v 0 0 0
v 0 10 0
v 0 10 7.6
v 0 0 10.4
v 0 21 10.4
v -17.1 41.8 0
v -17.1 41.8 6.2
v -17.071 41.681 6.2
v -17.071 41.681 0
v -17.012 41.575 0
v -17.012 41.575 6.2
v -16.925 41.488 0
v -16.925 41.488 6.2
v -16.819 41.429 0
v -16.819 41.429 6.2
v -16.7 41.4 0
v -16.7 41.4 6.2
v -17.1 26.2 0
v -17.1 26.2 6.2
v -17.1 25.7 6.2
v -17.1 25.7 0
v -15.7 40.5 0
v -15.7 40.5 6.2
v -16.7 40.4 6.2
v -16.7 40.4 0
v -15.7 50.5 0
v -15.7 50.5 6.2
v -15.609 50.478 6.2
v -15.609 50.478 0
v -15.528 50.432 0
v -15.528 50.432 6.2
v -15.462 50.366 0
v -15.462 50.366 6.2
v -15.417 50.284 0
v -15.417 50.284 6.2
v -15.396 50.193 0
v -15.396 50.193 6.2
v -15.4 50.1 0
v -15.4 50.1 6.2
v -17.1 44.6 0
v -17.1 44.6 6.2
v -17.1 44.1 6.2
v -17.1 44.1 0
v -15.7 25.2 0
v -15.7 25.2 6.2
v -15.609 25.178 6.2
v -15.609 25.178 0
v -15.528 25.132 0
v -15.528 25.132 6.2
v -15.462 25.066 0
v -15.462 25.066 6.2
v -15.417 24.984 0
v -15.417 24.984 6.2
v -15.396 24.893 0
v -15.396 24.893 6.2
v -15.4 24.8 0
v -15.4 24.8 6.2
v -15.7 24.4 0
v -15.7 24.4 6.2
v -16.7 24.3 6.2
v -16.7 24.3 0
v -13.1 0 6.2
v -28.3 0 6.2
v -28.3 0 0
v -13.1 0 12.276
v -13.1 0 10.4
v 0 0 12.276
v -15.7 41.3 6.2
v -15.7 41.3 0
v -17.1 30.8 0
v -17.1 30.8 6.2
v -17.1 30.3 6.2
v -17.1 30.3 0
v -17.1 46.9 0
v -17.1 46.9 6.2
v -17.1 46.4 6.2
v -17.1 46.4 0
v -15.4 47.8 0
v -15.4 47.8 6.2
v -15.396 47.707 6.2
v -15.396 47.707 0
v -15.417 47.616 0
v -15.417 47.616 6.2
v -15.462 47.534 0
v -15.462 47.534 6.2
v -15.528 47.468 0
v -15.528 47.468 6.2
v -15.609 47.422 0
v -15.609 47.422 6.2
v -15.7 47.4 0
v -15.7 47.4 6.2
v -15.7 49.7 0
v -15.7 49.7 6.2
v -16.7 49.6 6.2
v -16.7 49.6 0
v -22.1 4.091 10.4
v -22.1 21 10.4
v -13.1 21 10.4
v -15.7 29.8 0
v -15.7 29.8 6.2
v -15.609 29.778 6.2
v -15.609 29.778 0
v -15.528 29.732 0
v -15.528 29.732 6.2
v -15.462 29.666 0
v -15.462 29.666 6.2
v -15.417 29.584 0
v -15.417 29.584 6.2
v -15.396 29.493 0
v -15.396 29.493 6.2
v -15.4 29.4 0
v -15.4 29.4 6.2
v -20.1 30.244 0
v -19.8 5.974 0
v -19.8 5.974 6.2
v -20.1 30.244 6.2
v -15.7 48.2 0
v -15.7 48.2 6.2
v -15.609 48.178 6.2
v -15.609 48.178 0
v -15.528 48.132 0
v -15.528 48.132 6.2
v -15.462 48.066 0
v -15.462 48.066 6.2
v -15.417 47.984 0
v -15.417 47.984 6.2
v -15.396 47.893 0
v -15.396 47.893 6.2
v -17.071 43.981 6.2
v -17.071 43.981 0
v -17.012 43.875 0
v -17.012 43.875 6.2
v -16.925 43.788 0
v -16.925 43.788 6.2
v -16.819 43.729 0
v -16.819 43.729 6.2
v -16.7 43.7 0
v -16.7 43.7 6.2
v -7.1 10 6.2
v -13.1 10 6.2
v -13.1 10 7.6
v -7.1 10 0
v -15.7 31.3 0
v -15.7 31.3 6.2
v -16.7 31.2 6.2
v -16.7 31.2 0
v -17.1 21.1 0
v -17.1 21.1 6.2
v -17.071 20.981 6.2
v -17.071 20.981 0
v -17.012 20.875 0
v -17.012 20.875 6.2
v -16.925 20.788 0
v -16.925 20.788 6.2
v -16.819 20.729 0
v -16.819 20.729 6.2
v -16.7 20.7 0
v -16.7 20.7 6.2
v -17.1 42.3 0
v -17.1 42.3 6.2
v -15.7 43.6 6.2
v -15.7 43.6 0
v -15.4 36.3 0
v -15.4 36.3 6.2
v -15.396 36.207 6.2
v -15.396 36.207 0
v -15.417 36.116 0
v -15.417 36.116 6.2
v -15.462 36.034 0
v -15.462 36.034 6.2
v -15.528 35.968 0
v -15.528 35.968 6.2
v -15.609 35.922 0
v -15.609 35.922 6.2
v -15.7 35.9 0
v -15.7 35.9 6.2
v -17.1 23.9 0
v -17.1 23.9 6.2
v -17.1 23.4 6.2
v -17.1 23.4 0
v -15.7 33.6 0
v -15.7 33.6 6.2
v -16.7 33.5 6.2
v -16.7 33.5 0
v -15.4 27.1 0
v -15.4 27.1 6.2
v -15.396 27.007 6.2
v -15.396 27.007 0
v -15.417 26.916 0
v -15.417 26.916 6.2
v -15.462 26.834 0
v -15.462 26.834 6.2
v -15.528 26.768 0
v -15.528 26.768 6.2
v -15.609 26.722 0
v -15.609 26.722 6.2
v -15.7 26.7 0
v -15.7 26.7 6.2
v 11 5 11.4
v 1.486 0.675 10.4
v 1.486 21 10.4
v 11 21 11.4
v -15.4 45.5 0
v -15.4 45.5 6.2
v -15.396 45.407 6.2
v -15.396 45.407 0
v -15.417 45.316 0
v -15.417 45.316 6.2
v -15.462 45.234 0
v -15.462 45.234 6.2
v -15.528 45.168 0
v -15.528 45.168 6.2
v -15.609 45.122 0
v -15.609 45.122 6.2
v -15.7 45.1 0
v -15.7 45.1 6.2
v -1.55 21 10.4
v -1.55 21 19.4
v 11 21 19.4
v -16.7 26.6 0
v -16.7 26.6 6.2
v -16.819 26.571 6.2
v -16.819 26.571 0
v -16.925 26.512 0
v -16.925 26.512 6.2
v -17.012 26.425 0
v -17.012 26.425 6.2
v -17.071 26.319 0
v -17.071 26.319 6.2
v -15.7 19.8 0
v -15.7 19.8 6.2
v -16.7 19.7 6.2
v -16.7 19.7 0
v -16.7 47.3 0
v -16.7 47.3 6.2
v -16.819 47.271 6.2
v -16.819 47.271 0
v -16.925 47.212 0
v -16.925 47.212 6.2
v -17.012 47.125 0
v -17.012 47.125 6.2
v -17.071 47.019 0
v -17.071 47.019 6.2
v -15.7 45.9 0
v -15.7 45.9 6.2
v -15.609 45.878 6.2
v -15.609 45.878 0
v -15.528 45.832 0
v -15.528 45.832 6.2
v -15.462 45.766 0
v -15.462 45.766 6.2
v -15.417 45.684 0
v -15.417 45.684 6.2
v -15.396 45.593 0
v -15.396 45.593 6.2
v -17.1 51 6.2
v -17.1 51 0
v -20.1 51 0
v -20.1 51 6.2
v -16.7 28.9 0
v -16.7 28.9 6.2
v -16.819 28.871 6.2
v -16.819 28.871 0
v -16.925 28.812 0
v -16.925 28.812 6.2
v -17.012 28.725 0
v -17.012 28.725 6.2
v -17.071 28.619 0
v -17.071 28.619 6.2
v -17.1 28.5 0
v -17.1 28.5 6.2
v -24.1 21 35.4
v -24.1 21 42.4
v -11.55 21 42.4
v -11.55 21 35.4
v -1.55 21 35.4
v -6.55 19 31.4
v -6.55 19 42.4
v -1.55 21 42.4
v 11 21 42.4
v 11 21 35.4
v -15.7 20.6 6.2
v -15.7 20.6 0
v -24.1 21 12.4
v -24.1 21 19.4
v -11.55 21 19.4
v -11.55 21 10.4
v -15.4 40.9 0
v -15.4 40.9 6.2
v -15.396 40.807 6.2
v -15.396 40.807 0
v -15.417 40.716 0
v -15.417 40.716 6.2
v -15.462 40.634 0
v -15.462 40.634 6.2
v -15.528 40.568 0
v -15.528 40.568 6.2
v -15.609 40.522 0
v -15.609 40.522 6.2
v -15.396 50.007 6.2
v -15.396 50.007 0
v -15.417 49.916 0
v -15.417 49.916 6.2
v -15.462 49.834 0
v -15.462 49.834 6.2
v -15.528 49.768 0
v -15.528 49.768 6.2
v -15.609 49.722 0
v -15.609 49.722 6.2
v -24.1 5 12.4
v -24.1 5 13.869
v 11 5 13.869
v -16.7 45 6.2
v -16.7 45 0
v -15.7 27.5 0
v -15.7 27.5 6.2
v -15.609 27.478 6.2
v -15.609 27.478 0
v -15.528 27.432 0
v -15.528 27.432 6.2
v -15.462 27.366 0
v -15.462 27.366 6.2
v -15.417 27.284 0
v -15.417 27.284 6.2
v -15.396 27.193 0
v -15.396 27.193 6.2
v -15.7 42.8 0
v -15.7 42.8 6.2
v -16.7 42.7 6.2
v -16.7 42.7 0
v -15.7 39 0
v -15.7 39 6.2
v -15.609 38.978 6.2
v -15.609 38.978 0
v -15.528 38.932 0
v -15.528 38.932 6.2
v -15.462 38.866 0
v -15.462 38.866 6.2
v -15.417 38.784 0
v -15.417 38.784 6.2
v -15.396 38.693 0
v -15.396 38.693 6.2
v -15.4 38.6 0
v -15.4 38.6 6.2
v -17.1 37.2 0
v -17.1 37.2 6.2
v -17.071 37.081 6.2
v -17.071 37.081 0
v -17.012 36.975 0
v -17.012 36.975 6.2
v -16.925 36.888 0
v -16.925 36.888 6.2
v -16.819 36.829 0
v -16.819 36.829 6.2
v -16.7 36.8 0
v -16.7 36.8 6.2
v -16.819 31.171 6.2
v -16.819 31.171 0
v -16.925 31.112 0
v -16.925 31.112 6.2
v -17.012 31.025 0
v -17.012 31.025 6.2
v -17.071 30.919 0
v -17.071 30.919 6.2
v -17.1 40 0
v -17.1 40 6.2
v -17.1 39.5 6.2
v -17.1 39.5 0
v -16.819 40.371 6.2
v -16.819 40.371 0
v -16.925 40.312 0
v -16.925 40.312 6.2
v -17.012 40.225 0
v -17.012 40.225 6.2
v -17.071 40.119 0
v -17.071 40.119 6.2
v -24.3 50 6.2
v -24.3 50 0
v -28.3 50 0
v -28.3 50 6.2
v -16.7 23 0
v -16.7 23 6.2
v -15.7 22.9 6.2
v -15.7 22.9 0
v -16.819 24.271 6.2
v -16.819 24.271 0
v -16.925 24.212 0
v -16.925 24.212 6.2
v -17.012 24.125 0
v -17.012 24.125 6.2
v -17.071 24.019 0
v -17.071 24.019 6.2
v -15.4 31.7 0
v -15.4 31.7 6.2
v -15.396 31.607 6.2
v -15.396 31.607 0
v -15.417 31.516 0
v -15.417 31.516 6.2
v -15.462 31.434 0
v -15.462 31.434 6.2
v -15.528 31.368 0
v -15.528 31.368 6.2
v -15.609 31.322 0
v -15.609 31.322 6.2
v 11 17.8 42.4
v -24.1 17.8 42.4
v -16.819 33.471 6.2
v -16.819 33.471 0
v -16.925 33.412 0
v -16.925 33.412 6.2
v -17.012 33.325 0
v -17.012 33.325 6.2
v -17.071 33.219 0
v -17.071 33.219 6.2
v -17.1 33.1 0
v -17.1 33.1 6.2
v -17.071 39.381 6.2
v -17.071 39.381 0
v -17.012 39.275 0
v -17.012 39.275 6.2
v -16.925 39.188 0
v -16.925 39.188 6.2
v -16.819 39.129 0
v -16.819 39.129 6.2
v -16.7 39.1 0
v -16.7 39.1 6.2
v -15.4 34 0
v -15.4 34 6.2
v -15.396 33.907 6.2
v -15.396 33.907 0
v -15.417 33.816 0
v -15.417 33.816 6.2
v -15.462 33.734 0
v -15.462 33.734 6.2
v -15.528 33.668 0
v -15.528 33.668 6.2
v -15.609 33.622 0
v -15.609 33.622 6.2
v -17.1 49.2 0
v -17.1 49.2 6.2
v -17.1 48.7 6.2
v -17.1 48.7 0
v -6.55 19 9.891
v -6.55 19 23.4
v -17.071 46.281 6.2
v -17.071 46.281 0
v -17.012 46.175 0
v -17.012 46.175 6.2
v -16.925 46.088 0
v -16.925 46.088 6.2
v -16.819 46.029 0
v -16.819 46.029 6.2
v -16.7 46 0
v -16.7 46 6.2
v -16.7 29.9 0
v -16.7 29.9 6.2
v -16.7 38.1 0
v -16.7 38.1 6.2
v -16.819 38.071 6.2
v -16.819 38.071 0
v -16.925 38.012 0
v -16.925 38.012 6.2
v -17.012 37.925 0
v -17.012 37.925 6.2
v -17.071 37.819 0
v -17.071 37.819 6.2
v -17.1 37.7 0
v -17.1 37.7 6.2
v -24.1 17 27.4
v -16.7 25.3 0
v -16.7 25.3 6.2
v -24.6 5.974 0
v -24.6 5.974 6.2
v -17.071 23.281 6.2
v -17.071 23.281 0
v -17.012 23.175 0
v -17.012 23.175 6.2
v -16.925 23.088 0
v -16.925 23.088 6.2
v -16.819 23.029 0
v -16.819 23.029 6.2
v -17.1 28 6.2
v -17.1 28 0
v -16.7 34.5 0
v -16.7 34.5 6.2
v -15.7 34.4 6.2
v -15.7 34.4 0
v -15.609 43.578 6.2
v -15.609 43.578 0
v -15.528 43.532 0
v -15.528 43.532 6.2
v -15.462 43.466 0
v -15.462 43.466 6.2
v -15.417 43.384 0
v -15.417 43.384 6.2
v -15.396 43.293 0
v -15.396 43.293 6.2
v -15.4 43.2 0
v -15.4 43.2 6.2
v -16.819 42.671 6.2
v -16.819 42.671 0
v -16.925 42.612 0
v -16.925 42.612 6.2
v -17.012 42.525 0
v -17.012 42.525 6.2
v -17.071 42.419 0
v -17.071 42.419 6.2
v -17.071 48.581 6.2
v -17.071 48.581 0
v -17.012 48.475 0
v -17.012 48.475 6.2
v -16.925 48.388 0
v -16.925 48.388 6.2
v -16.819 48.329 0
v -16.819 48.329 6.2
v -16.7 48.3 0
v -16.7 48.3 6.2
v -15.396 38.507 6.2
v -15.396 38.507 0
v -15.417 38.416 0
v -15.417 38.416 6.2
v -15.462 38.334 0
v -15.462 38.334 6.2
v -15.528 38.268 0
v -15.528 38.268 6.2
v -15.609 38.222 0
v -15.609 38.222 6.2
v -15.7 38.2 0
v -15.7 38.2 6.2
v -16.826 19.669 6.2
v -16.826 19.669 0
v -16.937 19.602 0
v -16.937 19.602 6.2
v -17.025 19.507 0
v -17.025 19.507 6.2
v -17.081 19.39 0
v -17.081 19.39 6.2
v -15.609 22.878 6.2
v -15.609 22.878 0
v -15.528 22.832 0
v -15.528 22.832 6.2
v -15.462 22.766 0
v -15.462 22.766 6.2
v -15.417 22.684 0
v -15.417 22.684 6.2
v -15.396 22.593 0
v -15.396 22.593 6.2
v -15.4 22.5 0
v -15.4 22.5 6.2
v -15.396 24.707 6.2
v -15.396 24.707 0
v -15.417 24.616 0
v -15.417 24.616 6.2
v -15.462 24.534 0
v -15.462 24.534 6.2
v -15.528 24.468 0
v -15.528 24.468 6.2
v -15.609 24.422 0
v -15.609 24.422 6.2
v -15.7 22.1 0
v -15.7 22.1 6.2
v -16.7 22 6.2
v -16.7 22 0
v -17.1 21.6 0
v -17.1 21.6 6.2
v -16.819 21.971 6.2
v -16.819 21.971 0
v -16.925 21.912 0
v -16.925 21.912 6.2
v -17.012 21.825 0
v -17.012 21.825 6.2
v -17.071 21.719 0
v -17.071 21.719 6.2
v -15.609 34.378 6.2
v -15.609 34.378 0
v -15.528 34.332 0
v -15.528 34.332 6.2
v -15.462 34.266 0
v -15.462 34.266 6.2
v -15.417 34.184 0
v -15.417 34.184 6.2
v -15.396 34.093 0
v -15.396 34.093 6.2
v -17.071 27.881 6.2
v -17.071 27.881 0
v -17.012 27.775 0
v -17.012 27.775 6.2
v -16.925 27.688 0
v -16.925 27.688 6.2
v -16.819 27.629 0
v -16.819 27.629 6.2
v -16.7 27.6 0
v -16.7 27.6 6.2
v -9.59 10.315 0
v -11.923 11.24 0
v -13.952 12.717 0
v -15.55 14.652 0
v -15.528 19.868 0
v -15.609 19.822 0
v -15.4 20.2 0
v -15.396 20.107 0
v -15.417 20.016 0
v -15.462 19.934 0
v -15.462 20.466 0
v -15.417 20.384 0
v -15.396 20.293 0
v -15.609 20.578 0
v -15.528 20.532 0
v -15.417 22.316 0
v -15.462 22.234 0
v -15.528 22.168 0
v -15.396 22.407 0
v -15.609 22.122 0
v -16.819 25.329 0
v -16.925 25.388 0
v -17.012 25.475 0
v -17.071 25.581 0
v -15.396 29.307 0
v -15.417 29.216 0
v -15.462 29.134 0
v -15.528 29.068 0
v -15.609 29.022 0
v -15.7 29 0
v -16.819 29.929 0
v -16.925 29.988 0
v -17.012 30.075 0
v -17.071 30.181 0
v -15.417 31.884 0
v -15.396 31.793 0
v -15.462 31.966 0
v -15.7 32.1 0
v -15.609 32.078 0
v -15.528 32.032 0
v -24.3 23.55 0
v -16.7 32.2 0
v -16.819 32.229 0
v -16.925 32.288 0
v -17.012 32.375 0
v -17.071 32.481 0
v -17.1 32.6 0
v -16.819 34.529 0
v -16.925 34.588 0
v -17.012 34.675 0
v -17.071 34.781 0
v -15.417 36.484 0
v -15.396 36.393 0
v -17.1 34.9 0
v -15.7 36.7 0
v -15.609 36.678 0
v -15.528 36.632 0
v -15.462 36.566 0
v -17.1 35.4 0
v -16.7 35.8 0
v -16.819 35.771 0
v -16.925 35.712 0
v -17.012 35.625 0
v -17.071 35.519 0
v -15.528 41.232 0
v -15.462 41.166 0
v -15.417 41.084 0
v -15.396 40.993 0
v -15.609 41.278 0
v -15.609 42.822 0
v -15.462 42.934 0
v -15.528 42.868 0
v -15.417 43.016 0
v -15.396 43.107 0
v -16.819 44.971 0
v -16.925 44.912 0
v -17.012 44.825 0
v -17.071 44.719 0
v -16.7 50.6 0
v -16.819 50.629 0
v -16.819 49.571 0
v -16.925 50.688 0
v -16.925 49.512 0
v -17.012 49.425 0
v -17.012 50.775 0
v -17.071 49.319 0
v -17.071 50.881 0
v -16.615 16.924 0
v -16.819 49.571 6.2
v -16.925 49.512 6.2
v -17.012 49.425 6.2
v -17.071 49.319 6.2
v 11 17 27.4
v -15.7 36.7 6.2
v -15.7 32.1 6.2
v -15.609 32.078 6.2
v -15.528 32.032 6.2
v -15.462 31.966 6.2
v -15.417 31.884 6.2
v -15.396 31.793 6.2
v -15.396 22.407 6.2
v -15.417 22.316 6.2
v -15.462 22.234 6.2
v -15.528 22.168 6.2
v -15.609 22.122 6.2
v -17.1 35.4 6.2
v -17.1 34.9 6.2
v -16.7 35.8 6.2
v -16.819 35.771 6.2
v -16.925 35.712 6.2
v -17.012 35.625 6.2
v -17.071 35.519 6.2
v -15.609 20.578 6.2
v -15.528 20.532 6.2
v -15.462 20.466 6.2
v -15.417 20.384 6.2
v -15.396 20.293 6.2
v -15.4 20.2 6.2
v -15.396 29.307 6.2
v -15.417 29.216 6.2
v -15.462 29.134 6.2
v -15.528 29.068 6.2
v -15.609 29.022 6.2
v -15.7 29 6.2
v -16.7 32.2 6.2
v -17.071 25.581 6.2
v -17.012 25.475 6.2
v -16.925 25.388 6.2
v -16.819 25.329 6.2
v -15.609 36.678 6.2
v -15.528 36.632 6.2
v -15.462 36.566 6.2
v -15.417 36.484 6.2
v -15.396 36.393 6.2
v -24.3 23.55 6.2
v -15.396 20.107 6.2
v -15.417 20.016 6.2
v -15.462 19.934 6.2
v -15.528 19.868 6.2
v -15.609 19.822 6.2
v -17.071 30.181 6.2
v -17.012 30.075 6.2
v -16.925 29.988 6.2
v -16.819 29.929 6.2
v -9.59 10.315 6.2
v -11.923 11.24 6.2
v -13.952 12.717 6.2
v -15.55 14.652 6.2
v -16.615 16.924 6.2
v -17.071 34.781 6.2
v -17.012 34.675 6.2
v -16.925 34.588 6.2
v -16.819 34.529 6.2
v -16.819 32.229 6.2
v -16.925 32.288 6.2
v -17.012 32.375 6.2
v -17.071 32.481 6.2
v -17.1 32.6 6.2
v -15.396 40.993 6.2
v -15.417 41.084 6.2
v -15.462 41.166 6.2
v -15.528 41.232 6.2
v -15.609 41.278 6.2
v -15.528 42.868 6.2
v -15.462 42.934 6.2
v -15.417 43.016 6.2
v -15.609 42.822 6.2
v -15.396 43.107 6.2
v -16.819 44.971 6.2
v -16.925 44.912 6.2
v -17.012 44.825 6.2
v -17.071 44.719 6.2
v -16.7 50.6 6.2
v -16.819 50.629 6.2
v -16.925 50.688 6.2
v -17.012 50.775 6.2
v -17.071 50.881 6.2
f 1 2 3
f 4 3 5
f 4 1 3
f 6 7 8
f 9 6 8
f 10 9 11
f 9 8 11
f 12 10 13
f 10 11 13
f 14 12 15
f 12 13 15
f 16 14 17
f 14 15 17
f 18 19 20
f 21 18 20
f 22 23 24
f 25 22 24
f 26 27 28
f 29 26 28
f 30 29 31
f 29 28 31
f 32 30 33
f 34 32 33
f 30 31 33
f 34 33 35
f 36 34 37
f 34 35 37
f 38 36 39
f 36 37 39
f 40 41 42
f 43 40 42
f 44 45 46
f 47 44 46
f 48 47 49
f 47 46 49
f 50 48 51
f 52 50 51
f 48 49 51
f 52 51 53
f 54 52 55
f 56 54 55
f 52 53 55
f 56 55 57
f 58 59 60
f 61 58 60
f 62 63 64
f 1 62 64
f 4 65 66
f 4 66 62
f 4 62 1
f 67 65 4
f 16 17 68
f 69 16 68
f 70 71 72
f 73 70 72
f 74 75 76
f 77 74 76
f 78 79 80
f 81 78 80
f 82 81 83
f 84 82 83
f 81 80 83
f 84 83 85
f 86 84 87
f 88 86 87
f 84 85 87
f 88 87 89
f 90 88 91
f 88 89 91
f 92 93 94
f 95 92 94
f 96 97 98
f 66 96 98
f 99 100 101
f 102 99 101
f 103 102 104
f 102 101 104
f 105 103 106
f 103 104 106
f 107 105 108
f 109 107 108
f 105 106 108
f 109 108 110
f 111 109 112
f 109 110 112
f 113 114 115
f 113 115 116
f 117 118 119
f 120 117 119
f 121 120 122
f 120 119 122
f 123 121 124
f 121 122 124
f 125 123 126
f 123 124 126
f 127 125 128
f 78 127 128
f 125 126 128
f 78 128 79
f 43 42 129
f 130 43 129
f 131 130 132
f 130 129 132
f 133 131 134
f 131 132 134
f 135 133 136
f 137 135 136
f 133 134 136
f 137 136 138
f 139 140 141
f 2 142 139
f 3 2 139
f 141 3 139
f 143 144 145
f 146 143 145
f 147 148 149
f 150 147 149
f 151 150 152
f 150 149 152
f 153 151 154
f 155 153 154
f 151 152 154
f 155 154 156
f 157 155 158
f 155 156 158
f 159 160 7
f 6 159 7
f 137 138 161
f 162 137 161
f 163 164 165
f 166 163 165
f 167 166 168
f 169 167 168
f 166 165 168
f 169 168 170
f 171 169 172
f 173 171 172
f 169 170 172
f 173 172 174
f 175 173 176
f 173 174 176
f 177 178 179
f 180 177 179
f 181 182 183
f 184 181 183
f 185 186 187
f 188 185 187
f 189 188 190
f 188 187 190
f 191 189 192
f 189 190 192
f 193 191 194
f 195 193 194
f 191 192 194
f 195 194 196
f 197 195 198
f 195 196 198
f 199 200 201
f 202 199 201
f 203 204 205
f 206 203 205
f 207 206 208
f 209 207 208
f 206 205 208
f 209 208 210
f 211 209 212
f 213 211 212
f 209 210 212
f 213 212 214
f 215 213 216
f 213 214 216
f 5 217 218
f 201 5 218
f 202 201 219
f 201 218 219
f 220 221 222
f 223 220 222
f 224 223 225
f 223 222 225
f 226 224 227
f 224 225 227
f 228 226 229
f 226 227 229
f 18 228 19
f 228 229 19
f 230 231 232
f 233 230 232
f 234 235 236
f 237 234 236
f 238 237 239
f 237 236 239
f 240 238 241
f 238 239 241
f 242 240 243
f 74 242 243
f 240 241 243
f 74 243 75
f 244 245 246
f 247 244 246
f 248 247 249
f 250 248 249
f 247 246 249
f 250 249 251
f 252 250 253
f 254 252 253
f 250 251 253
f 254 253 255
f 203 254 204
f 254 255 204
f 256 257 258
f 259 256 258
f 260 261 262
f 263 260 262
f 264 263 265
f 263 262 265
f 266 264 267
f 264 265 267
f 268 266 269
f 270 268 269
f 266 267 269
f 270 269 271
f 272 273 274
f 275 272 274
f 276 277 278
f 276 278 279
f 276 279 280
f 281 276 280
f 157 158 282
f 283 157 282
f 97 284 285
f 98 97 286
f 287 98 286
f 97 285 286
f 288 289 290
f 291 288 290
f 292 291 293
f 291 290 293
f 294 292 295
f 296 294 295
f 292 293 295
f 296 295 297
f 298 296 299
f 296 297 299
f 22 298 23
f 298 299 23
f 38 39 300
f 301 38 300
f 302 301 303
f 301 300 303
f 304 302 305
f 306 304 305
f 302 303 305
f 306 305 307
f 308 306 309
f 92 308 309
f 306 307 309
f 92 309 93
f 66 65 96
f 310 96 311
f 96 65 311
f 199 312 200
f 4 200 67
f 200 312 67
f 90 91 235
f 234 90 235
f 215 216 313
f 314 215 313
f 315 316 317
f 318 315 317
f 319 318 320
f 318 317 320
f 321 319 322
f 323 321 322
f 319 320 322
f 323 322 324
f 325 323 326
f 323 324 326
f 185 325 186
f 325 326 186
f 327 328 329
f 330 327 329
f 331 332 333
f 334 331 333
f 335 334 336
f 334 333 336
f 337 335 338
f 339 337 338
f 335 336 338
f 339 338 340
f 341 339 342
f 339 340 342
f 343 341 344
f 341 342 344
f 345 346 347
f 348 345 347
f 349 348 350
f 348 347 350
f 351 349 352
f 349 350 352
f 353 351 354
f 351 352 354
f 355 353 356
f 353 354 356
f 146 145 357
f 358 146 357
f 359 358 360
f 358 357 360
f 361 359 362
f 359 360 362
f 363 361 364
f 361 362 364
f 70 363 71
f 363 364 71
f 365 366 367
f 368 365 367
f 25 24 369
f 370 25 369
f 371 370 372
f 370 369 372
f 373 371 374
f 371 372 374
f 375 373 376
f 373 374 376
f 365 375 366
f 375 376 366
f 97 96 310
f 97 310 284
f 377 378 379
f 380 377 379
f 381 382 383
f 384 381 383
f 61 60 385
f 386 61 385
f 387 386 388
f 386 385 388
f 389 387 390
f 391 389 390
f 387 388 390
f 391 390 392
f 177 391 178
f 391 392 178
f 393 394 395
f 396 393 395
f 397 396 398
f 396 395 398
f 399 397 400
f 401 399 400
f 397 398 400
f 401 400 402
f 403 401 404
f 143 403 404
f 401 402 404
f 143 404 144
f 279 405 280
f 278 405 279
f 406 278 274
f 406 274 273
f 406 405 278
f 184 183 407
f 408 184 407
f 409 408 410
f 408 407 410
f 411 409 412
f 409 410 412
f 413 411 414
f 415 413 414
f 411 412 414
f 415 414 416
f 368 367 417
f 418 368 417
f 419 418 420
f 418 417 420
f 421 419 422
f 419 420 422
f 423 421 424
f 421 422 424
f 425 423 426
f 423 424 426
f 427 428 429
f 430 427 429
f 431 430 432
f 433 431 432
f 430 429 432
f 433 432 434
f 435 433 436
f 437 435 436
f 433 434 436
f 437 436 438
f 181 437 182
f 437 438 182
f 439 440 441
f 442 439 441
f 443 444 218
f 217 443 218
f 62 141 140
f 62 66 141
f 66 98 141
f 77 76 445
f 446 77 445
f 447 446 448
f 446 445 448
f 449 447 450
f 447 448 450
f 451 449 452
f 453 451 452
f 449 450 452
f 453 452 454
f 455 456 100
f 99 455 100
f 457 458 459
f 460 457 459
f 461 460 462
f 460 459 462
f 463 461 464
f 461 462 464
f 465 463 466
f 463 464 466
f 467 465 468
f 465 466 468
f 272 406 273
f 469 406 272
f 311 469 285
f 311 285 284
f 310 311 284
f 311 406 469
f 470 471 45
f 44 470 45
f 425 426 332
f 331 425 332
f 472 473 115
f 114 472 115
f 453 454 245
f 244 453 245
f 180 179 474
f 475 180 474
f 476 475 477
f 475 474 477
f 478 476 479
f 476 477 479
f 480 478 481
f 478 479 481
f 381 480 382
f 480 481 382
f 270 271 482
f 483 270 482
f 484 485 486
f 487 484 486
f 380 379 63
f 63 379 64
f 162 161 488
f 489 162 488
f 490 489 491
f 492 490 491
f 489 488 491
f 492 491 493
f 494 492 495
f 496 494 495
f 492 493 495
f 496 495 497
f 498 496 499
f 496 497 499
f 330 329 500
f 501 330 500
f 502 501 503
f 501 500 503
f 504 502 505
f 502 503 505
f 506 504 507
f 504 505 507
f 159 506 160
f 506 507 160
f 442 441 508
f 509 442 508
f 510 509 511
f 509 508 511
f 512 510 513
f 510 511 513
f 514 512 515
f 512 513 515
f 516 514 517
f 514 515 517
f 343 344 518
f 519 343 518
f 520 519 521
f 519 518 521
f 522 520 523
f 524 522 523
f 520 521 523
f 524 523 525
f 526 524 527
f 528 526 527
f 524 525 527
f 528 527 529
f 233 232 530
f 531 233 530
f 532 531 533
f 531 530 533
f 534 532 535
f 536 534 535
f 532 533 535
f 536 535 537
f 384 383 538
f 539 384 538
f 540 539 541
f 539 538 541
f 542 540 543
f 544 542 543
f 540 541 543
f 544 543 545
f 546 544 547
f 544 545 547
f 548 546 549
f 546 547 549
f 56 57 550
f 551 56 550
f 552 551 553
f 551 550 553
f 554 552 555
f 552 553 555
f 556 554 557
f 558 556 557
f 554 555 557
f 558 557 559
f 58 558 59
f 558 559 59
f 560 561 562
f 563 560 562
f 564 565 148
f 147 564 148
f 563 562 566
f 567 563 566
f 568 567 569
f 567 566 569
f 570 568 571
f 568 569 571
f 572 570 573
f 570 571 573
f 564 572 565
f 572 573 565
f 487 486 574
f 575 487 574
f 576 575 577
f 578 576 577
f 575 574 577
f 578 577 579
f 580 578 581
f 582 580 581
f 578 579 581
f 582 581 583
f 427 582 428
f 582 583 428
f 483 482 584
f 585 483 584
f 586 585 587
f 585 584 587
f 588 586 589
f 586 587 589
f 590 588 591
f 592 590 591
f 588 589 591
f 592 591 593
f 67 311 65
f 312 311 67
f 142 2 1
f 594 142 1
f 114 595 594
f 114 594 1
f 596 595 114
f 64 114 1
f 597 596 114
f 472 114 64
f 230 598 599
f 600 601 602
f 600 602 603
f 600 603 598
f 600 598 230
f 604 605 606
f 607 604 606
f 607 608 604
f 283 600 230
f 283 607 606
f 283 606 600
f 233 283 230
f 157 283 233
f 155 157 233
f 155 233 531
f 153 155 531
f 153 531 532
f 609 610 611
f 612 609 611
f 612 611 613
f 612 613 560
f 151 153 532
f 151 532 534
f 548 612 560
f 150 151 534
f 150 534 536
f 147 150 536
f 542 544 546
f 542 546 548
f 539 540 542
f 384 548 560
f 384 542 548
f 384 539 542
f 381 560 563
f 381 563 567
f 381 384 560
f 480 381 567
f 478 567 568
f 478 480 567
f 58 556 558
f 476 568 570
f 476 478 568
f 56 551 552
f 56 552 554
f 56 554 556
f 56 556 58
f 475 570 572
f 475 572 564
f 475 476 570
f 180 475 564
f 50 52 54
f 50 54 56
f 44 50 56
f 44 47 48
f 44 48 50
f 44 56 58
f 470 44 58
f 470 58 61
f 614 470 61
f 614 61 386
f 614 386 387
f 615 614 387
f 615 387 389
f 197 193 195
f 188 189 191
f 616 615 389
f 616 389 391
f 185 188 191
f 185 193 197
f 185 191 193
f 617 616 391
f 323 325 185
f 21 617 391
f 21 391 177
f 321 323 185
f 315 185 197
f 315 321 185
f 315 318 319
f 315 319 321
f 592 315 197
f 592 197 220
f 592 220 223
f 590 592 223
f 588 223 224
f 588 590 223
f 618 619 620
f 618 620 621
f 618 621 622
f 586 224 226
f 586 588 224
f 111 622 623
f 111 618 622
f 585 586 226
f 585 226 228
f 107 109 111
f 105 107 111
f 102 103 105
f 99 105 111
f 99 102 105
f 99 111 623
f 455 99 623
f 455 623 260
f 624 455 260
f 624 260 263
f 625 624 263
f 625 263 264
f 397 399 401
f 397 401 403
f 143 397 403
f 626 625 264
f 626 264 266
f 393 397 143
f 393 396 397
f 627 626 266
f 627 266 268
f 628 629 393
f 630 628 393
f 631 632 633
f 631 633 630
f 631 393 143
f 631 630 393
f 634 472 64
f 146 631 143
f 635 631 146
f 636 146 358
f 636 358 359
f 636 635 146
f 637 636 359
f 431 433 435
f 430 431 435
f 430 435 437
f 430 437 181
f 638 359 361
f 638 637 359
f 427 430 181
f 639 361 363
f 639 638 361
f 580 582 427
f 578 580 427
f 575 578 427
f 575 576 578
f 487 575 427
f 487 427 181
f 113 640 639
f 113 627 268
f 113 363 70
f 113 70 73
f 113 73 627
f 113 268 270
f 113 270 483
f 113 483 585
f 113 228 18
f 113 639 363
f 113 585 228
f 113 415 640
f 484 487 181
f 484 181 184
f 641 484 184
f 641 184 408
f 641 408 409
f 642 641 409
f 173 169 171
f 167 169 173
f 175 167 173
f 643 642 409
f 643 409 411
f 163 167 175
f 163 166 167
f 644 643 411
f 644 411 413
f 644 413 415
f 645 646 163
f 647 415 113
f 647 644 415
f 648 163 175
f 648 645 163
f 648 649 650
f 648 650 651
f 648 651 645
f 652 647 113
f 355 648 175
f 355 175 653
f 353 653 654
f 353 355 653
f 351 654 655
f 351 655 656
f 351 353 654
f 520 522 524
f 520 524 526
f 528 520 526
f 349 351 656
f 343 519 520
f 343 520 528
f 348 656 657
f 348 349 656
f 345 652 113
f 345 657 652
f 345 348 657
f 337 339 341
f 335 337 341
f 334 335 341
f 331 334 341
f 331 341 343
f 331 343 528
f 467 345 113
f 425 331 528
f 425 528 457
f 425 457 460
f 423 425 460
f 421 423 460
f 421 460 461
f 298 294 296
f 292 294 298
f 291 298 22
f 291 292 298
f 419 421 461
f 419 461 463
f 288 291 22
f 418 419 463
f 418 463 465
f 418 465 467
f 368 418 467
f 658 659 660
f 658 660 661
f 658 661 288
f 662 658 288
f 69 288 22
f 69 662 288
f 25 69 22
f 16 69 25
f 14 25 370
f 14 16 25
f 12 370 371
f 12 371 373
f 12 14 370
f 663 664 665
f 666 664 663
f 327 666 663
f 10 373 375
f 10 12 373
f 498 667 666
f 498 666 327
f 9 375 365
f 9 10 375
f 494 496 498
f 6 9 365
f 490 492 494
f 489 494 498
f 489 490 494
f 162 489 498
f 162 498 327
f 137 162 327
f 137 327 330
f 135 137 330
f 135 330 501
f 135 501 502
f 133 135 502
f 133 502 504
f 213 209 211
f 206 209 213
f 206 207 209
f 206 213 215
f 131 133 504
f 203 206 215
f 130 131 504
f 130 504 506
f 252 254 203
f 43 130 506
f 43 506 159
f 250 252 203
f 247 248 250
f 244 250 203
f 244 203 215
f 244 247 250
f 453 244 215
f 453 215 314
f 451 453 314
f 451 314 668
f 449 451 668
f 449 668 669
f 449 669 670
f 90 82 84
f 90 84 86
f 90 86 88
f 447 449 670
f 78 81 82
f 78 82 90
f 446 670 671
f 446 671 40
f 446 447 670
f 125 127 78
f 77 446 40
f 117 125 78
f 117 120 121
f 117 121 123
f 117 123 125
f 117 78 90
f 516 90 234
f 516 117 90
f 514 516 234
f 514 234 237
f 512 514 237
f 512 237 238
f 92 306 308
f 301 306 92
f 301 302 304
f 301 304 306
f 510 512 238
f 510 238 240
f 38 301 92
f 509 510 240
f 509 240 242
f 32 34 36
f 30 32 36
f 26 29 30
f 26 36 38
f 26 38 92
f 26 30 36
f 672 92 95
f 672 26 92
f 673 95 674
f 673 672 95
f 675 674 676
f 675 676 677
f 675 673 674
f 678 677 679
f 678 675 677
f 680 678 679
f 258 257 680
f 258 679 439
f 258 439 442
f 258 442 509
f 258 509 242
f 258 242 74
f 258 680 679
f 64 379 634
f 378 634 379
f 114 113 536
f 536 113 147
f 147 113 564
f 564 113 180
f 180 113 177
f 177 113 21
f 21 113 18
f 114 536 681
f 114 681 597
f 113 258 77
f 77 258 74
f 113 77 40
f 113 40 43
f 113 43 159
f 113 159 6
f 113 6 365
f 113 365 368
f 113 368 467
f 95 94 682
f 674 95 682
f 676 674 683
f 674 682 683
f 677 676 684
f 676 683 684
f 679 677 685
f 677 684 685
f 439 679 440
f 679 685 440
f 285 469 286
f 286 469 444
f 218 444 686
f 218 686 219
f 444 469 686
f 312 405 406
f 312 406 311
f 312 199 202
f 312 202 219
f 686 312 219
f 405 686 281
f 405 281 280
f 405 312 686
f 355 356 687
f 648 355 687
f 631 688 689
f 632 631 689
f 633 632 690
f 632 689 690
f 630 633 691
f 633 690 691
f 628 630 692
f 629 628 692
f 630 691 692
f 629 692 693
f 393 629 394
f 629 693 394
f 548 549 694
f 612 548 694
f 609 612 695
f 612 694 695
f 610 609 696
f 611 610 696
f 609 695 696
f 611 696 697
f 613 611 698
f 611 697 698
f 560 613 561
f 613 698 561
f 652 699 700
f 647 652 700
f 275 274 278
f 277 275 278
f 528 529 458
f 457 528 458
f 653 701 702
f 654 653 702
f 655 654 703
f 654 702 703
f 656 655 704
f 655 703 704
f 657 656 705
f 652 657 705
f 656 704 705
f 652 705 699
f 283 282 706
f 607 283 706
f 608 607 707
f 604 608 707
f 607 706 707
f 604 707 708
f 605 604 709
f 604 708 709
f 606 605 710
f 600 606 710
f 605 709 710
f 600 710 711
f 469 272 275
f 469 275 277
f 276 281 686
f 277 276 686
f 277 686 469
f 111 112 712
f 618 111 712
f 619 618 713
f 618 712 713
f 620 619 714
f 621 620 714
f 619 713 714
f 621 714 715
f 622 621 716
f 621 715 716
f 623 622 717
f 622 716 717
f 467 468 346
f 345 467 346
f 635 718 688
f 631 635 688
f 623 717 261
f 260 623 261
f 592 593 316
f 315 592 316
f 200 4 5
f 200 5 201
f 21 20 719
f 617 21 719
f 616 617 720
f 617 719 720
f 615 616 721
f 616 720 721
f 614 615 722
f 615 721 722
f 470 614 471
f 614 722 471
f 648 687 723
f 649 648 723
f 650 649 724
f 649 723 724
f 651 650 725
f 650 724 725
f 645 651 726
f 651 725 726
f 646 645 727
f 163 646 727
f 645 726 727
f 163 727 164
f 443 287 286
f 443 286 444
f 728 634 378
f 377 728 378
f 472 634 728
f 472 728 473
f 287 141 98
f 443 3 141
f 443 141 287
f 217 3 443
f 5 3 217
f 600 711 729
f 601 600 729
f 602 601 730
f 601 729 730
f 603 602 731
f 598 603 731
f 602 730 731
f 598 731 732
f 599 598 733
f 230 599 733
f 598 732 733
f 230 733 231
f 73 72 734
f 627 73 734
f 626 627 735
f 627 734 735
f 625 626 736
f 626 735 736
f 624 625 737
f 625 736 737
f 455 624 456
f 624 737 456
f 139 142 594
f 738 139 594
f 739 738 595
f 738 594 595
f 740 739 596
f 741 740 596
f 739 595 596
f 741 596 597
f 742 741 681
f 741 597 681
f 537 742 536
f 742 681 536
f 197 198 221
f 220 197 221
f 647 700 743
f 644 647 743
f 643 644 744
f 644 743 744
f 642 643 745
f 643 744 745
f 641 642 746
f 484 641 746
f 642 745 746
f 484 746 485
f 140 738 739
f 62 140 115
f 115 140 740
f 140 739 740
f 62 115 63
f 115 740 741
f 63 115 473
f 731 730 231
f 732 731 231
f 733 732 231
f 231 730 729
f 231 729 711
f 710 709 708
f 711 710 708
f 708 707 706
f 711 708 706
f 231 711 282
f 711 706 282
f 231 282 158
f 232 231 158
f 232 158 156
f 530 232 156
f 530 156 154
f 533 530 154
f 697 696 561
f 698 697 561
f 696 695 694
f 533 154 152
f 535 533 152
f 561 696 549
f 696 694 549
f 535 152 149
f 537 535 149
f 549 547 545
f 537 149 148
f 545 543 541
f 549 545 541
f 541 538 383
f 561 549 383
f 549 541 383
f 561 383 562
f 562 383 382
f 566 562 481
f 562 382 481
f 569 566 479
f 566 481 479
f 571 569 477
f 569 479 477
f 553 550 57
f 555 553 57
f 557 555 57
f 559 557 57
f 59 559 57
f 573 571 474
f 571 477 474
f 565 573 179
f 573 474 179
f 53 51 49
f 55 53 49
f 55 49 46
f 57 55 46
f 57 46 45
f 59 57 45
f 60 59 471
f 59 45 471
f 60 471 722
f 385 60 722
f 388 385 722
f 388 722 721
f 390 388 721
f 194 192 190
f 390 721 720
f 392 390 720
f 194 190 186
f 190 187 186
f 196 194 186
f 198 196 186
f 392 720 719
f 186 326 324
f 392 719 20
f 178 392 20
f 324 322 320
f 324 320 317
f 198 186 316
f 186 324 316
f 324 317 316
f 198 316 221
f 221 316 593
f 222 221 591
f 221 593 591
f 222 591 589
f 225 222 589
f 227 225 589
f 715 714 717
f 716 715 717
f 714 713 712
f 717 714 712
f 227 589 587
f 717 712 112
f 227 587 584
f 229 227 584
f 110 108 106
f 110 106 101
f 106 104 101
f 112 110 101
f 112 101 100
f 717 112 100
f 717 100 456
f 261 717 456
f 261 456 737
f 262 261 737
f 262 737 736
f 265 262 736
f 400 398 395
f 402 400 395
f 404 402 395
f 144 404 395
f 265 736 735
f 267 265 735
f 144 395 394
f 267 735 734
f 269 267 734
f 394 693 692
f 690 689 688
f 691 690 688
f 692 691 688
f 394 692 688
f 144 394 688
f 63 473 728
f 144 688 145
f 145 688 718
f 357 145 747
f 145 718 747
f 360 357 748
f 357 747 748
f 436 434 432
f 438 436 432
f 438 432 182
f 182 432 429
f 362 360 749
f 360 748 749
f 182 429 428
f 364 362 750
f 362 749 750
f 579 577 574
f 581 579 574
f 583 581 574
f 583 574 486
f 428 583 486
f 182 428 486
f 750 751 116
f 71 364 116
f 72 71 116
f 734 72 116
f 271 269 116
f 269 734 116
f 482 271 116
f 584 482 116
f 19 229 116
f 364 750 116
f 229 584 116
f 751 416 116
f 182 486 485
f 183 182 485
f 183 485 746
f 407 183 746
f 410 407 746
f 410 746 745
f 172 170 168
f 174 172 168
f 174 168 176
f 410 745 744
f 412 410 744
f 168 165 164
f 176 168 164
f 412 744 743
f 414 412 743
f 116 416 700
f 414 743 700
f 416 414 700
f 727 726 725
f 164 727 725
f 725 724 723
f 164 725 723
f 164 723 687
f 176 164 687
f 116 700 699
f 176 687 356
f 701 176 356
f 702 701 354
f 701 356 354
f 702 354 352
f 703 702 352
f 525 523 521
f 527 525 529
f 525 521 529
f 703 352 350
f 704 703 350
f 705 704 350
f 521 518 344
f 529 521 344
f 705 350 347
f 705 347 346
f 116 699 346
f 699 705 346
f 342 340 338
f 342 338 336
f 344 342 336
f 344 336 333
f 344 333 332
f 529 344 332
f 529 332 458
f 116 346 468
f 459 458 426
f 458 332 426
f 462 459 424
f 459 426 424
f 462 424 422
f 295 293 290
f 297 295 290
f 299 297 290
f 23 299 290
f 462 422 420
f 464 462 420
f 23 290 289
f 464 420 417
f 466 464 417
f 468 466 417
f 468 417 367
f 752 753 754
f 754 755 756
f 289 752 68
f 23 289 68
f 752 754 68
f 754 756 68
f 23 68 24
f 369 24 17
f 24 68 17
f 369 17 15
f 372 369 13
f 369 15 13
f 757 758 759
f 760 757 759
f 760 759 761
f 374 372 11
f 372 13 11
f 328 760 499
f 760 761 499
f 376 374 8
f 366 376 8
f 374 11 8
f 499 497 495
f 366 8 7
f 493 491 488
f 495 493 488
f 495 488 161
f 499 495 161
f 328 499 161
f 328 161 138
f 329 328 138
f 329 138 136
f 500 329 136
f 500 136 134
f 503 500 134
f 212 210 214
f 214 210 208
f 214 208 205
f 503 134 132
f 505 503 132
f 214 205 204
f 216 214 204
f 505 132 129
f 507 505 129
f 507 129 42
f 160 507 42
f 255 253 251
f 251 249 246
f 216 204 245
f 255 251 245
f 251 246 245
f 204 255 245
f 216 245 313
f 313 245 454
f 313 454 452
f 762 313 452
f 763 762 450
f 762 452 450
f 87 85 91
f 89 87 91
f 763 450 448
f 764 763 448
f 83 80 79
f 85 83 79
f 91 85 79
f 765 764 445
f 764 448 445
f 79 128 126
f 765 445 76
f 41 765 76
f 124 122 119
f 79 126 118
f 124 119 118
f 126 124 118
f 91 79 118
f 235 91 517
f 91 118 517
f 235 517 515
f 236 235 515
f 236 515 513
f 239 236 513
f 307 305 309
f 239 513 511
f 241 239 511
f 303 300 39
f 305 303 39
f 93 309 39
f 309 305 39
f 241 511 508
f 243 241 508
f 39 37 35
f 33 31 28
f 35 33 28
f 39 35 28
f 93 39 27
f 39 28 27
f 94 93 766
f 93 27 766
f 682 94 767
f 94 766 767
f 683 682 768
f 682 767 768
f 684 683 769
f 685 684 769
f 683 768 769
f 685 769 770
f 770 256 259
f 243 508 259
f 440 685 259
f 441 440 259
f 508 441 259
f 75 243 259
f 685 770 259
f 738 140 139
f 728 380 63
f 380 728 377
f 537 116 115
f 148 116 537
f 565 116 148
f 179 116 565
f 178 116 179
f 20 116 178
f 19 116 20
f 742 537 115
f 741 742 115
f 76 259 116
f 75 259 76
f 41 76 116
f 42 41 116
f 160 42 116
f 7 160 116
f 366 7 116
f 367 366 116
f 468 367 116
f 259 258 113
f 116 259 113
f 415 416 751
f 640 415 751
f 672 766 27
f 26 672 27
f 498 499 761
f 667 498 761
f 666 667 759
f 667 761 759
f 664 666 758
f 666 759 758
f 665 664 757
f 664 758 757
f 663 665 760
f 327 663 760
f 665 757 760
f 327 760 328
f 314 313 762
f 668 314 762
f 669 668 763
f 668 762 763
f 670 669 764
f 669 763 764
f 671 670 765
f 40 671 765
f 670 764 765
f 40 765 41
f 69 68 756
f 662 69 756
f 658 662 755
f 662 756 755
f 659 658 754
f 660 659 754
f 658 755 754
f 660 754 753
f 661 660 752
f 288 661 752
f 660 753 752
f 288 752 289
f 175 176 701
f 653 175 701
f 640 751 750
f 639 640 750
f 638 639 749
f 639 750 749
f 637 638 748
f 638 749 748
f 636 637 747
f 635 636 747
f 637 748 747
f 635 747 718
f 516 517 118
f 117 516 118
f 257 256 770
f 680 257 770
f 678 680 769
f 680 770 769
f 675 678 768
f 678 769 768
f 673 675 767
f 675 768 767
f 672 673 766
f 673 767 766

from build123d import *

# Parameters (mm, degrees)
BOSS_EXTRUDE1_DEPTH = 6.2
BOSS_EXTRUDE2_DEPTH = 21
CHAMFER1_SIZE       = 5
CHAMFER1_SIZE2      = 28.356409098
CUT_EXTRUDE1_REACH  = 74.109
CHAMFER2_SIZE       = 1
CHAMFER2_SIZE2      = 9.514364454
CHAMFER3_SIZE       = 2
CUT_EXTRUDE2_REACH  = 79.092
CUT_EXTRUDE3_START  = -3.468867
CUT_EXTRUDE3_DEPTH  = 3.468867
BOSS_EXTRUDE3_DEPTH = 6.2
CUT_EXTRUDE4_REACH  = 79.092
CUT_EXTRUDE5_DEPTH  = 73.108598655
CUT_EXTRUDE6_REACH  = 74.109


with BuildPart() as part:
    # Sketch1 → Boss-Extrude1 (new body)
    with BuildSketch(Plane.XY):
        with BuildLine():
            Line((-28.3, 0), (0, 0))
            Line((0, 0), (0, 10))
            Line((0, 10), (-7.1, 10))
            ThreePointArc((-7.1, 10), (-14.171067812, 12.928932188), (-17.1, 20))
            Line((-17.1, 20), (-17.1, 51))
            Line((-17.1, 51), (-20.1, 51))
            Line((-20.1, 51), (-20.1, 6))
            Line((-20.1, 6), (-24.3, 6))
            Line((-24.3, 6), (-24.3, 50))
            Line((-24.3, 50), (-28.3, 50))
            Line((-28.3, 50), (-28.3, 0))
        make_face()
    extrude(amount=BOSS_EXTRUDE1_DEPTH)

    # Sketch2 → Boss-Extrude2 (add)
    with BuildSketch(Plane.XZ):
        Polygon((0, 6.2), (0, 10.4), (11, 10.4), (11, 42.4), (-24.1, 42.4), (-24.1, 10.4), (-13.1, 10.4), (-13.1, 6.2), align=None)
    extrude(amount=-BOSS_EXTRUDE2_DEPTH)

    # Chamfer1
    chamfer1_edges = [part.edges().sort_by_distance(p)[0] for p in [
        (-6.55, 0, 42.4),
    ]]
    chamfer1_side = [part.faces().sort_by_distance(p)[0] for p in [
        (-6.55, 10.5, 42.4),
    ]]
    chamfer(chamfer1_edges, length=CHAMFER1_SIZE, length2=CHAMFER1_SIZE2, reference=chamfer1_side[0])

    # Sketch3 → Cut-Extrude1 (cut, up to next)
    with BuildSketch(Plane(origin=(0, 0, 0), x_dir=(0, 0, -1), z_dir=(1, 0, 0)), mode=Mode.PRIVATE) as cut_extrude1_sk1:
        Polygon((-6.2, 10), (-7.6, 10), (-10.4, 21), (-6.2, 21), align=None)
    cut_extrude1_tool1 = extrude(cut_extrude1_sk1.sketch, amount=-CUT_EXTRUDE1_REACH, mode=Mode.PRIVATE) & part.part
    add(cut_extrude1_tool1.solids().sort_by_distance((0, 16.416667, 7.716667))[0], mode=Mode.SUBTRACT)

    # Chamfer2
    chamfer2_edges = [part.edges().sort_by_distance(p)[0] for p in [
        (11, 10.5, 10.4),
    ]]
    chamfer2_side = [part.faces().sort_by_distance(p)[0] for p in [
        (11, 11.541747932, 25.62778603),
    ]]
    chamfer(chamfer2_edges, length=CHAMFER2_SIZE, length2=CHAMFER2_SIZE2, reference=chamfer2_side[0])

    # Chamfer3
    chamfer3_edges = [part.edges().sort_by_distance(p)[0] for p in [
        (-24.1, 10.5, 10.4),
    ]]
    chamfer(chamfer3_edges, length=CHAMFER3_SIZE)

    # Sketch5 → Cut-Extrude2 (cut, up to next)
    with BuildSketch(Plane(origin=(11, 0, 0), x_dir=(0, 0, -1), z_dir=(1, 0, 0)), mode=Mode.PRIVATE) as cut_extrude2_sk1:
        Polygon((-42.4, 17.8), (-13.86886709, 5), (-10.966215349, -4.108657177), (-44.036924755, 0.937700744), align=None)
    cut_extrude2_tool1 = extrude(cut_extrude2_sk1.sketch, amount=-CUT_EXTRUDE2_REACH, mode=Mode.PRIVATE) & part.part
    add(cut_extrude2_tool1.solids().sort_by_distance((11, 5.258773, 29.627692))[0], mode=Mode.SUBTRACT)

    # Sketch6 → Cut-Extrude3 (cut)
    with BuildSketch(Plane(origin=(0, 0, 10.4), x_dir=(-1, 0, 0), z_dir=(0, 0, -1)).offset(CUT_EXTRUDE3_START)):
        Polygon((13.1, 0), (24.1, 5), (37.198342989, 5), (28.62602328, -4.522208447), (-13.825974113, -5.629287686), (-20.705007466, 5), (-11, 5), (0, 0), align=None)
    extrude(amount=CUT_EXTRUDE3_DEPTH, mode=Mode.SUBTRACT)

    # Sketch7 → Boss-Extrude3 (add)
    with BuildSketch(Plane.XY.offset(6.2)):
        with BuildLine():
            Line((-16.7, 50.6), (-15.7, 50.5))
            ThreePointArc((-15.7, 50.5), (-15.462165524, 50.365875857), (-15.4, 50.1))
            ThreePointArc((-15.4, 50.1), (-15.462165524, 49.834124143), (-15.7, 49.7))
            Line((-15.7, 49.7), (-16.7, 49.6))
            ThreePointArc((-16.7, 49.6), (-16.971392676, 49.471392676), (-17.1, 49.2))
            Line((-17.1, 49.2), (-17.1, 48.7))
            ThreePointArc((-17.1, 48.7), (-16.971392676, 48.428607324), (-16.7, 48.3))
            Line((-16.7, 48.3), (-15.7, 48.2))
            ThreePointArc((-15.7, 48.2), (-15.462165524, 48.065875857), (-15.4, 47.8))
            ThreePointArc((-15.4, 47.8), (-15.462165524, 47.534124143), (-15.7, 47.4))
            Line((-15.7, 47.4), (-16.7, 47.3))
            ThreePointArc((-16.7, 47.3), (-16.971392676, 47.171392676), (-17.1, 46.9))
            Line((-17.1, 46.9), (-17.1, 46.4))
            ThreePointArc((-17.1, 46.4), (-16.971392676, 46.128607324), (-16.7, 46))
            Line((-16.7, 46), (-15.7, 45.9))
            ThreePointArc((-15.7, 45.9), (-15.462165524, 45.765875857), (-15.4, 45.5))
            ThreePointArc((-15.4, 45.5), (-15.462165524, 45.234124143), (-15.7, 45.1))
            Line((-15.7, 45.1), (-16.7, 45))
            ThreePointArc((-16.7, 45), (-16.971392676, 44.871392676), (-17.1, 44.6))
            Line((-17.1, 44.6), (-17.1, 44.1))
            ThreePointArc((-17.1, 44.1), (-16.971392676, 43.828607324), (-16.7, 43.7))
            Line((-16.7, 43.7), (-15.7, 43.6))
            ThreePointArc((-15.7, 43.6), (-15.462165524, 43.465875857), (-15.4, 43.2))
            ThreePointArc((-15.4, 43.2), (-15.462165524, 42.934124143), (-15.7, 42.8))
            Line((-15.7, 42.8), (-16.7, 42.7))
            ThreePointArc((-16.7, 42.7), (-16.971392676, 42.571392676), (-17.1, 42.3))
            Line((-17.1, 42.3), (-17.1, 41.8))
            ThreePointArc((-17.1, 41.8), (-16.971392676, 41.528607324), (-16.7, 41.4))
            Line((-16.7, 41.4), (-15.7, 41.3))
            ThreePointArc((-15.7, 41.3), (-15.462165524, 41.165875857), (-15.4, 40.9))
            ThreePointArc((-15.4, 40.9), (-15.462165524, 40.634124143), (-15.7, 40.5))
            Line((-15.7, 40.5), (-16.7, 40.4))
            ThreePointArc((-16.7, 40.4), (-16.971392676, 40.271392676), (-17.1, 40))
            Line((-17.1, 40), (-17.1, 39.5))
            ThreePointArc((-17.1, 39.5), (-16.971392676, 39.228607324), (-16.7, 39.1))
            Line((-16.7, 39.1), (-15.7, 39))
            ThreePointArc((-15.7, 39), (-15.462165524, 38.865875857), (-15.4, 38.6))
            ThreePointArc((-15.4, 38.6), (-15.462165524, 38.334124143), (-15.7, 38.2))
            Line((-15.7, 38.2), (-16.7, 38.1))
            ThreePointArc((-16.7, 38.1), (-16.971392676, 37.971392676), (-17.1, 37.7))
            Line((-17.1, 37.7), (-17.1, 37.2))
            ThreePointArc((-17.1, 37.2), (-16.971392676, 36.928607324), (-16.7, 36.8))
            Line((-16.7, 36.8), (-15.7, 36.7))
            ThreePointArc((-15.7, 36.7), (-15.462165524, 36.565875857), (-15.4, 36.3))
            ThreePointArc((-15.4, 36.3), (-15.462165524, 36.034124143), (-15.7, 35.9))
            Line((-15.7, 35.9), (-16.7, 35.8))
            ThreePointArc((-16.7, 35.8), (-16.971392676, 35.671392676), (-17.1, 35.4))
            Line((-17.1, 35.4), (-17.1, 34.9))
            ThreePointArc((-17.1, 34.9), (-16.971392676, 34.628607324), (-16.7, 34.5))
            Line((-16.7, 34.5), (-15.7, 34.4))
            ThreePointArc((-15.7, 34.4), (-15.462165524, 34.265875857), (-15.4, 34))
            ThreePointArc((-15.4, 34), (-15.462165524, 33.734124143), (-15.7, 33.6))
            Line((-15.7, 33.6), (-16.7, 33.5))
            ThreePointArc((-16.7, 33.5), (-16.971392676, 33.371392676), (-17.1, 33.1))
            Line((-17.1, 33.1), (-17.1, 32.6))
            ThreePointArc((-17.1, 32.6), (-16.971392676, 32.328607324), (-16.7, 32.2))
            Line((-16.7, 32.2), (-15.7, 32.1))
            ThreePointArc((-15.7, 32.1), (-15.462165524, 31.965875857), (-15.4, 31.7))
            ThreePointArc((-15.4, 31.7), (-15.462165524, 31.434124143), (-15.7, 31.3))
            Line((-15.7, 31.3), (-16.7, 31.2))
            ThreePointArc((-16.7, 31.2), (-16.971392676, 31.071392676), (-17.1, 30.8))
            Line((-17.1, 30.8), (-17.1, 30.3))
            ThreePointArc((-17.1, 30.3), (-16.971392676, 30.028607324), (-16.7, 29.9))
            Line((-16.7, 29.9), (-15.7, 29.8))
            ThreePointArc((-15.7, 29.8), (-15.462165524, 29.665875857), (-15.4, 29.4))
            ThreePointArc((-15.4, 29.4), (-15.462165524, 29.134124143), (-15.7, 29))
            Line((-15.7, 29), (-16.7, 28.9))
            ThreePointArc((-16.7, 28.9), (-16.971392676, 28.771392676), (-17.1, 28.5))
            Line((-17.1, 28.5), (-17.1, 28))
            ThreePointArc((-17.1, 28), (-16.971392676, 27.728607324), (-16.7, 27.6))
            Line((-16.7, 27.6), (-15.7, 27.5))
            ThreePointArc((-15.7, 27.5), (-15.462165524, 27.365875857), (-15.4, 27.1))
            ThreePointArc((-15.4, 27.1), (-15.462165524, 26.834124143), (-15.7, 26.7))
            Line((-15.7, 26.7), (-16.7, 26.6))
            ThreePointArc((-16.7, 26.6), (-16.971392676, 26.471392676), (-17.1, 26.2))
            Line((-17.1, 26.2), (-17.1, 25.7))
            ThreePointArc((-17.1, 25.7), (-16.971392676, 25.428607324), (-16.7, 25.3))
            Line((-16.7, 25.3), (-15.7, 25.2))
            ThreePointArc((-15.7, 25.2), (-15.462165524, 25.065875857), (-15.4, 24.8))
            ThreePointArc((-15.4, 24.8), (-15.462165524, 24.534124143), (-15.7, 24.4))
            Line((-15.7, 24.4), (-16.7, 24.3))
            ThreePointArc((-16.7, 24.3), (-16.971392676, 24.171392676), (-17.1, 23.9))
            Line((-17.1, 23.9), (-17.1, 23.4))
            ThreePointArc((-17.1, 23.4), (-16.971392676, 23.128607324), (-16.7, 23))
            Line((-16.7, 23), (-15.7, 22.9))
            ThreePointArc((-15.7, 22.9), (-15.462165524, 22.765875857), (-15.4, 22.5))
            ThreePointArc((-15.4, 22.5), (-15.462165524, 22.234124143), (-15.7, 22.1))
            Line((-15.7, 22.1), (-16.7, 22))
            ThreePointArc((-16.7, 22), (-16.971392676, 21.871392676), (-17.1, 21.6))
            Line((-17.1, 21.6), (-17.1, 21.1))
            ThreePointArc((-17.1, 21.1), (-16.971392676, 20.828607324), (-16.7, 20.7))
            Line((-16.7, 20.7), (-15.7, 20.6))
            ThreePointArc((-15.7, 20.6), (-15.462165524, 20.465875857), (-15.4, 20.2))
            ThreePointArc((-15.4, 20.2), (-15.462165524, 19.934124143), (-15.7, 19.8))
            Line((-15.7, 19.8), (-16.7, 19.7))
            ThreePointArc((-16.7, 19.7), (-16.971392676, 19.571392676), (-17.1, 19.3))
            Line((-17.1, 19.3), (-17.1, 18.8))
            Line((-17.1, 18.8), (-18.685, 49.2))
            Line((-18.685, 49.2), (-17.1, 51))
            ThreePointArc((-17.1, 51), (-16.971392676, 50.728607324), (-16.7, 50.6))
        make_face()
    extrude(amount=-BOSS_EXTRUDE3_DEPTH)

    # Sketch8 → Cut-Extrude4 (cut, up to next)
    with BuildSketch(Plane(origin=(11, 0, 0), x_dir=(0, 0, -1), z_dir=(1, 0, 0)), mode=Mode.PRIVATE) as cut_extrude4_sk1:
        Polygon((-35.4, 21), (-27.4, 17), (-19.4, 21), align=None)
    cut_extrude4_tool1 = extrude(cut_extrude4_sk1.sketch, amount=-CUT_EXTRUDE4_REACH, mode=Mode.PRIVATE) & part.part
    add(cut_extrude4_tool1.solids().sort_by_distance((11, 19.666667, 27.4))[0], mode=Mode.SUBTRACT)

    # Sketch10 → Cut-Extrude5 (cut, through all)
    with BuildSketch(Plane.XY.offset(42.4)):
        Polygon((-11.55, 21), (-6.55, 19), (-1.55, 21), align=None)
    extrude(amount=-CUT_EXTRUDE5_DEPTH, mode=Mode.SUBTRACT)

    # Sketch11 → Cut-Extrude6 (cut, up to next)
    with BuildSketch(Plane(origin=(0, 0, 0), x_dir=(-1, 0, 0), z_dir=(0, 0, -1)), mode=Mode.PRIVATE) as cut_extrude6_sk1:
        Polygon((24.3, 23.549969474), (24.6, 5.974018531), (19.8, 5.974018531), (20.1, 30.243837205), align=None)
    cut_extrude6_tool1 = extrude(cut_extrude6_sk1.sketch, amount=-CUT_EXTRUDE6_REACH, mode=Mode.PRIVATE) & part.part
    add(cut_extrude6_tool1.solids().sort_by_distance((-22.072028, 16.298165, 0))[0], mode=Mode.SUBTRACT)


solid = part.part
